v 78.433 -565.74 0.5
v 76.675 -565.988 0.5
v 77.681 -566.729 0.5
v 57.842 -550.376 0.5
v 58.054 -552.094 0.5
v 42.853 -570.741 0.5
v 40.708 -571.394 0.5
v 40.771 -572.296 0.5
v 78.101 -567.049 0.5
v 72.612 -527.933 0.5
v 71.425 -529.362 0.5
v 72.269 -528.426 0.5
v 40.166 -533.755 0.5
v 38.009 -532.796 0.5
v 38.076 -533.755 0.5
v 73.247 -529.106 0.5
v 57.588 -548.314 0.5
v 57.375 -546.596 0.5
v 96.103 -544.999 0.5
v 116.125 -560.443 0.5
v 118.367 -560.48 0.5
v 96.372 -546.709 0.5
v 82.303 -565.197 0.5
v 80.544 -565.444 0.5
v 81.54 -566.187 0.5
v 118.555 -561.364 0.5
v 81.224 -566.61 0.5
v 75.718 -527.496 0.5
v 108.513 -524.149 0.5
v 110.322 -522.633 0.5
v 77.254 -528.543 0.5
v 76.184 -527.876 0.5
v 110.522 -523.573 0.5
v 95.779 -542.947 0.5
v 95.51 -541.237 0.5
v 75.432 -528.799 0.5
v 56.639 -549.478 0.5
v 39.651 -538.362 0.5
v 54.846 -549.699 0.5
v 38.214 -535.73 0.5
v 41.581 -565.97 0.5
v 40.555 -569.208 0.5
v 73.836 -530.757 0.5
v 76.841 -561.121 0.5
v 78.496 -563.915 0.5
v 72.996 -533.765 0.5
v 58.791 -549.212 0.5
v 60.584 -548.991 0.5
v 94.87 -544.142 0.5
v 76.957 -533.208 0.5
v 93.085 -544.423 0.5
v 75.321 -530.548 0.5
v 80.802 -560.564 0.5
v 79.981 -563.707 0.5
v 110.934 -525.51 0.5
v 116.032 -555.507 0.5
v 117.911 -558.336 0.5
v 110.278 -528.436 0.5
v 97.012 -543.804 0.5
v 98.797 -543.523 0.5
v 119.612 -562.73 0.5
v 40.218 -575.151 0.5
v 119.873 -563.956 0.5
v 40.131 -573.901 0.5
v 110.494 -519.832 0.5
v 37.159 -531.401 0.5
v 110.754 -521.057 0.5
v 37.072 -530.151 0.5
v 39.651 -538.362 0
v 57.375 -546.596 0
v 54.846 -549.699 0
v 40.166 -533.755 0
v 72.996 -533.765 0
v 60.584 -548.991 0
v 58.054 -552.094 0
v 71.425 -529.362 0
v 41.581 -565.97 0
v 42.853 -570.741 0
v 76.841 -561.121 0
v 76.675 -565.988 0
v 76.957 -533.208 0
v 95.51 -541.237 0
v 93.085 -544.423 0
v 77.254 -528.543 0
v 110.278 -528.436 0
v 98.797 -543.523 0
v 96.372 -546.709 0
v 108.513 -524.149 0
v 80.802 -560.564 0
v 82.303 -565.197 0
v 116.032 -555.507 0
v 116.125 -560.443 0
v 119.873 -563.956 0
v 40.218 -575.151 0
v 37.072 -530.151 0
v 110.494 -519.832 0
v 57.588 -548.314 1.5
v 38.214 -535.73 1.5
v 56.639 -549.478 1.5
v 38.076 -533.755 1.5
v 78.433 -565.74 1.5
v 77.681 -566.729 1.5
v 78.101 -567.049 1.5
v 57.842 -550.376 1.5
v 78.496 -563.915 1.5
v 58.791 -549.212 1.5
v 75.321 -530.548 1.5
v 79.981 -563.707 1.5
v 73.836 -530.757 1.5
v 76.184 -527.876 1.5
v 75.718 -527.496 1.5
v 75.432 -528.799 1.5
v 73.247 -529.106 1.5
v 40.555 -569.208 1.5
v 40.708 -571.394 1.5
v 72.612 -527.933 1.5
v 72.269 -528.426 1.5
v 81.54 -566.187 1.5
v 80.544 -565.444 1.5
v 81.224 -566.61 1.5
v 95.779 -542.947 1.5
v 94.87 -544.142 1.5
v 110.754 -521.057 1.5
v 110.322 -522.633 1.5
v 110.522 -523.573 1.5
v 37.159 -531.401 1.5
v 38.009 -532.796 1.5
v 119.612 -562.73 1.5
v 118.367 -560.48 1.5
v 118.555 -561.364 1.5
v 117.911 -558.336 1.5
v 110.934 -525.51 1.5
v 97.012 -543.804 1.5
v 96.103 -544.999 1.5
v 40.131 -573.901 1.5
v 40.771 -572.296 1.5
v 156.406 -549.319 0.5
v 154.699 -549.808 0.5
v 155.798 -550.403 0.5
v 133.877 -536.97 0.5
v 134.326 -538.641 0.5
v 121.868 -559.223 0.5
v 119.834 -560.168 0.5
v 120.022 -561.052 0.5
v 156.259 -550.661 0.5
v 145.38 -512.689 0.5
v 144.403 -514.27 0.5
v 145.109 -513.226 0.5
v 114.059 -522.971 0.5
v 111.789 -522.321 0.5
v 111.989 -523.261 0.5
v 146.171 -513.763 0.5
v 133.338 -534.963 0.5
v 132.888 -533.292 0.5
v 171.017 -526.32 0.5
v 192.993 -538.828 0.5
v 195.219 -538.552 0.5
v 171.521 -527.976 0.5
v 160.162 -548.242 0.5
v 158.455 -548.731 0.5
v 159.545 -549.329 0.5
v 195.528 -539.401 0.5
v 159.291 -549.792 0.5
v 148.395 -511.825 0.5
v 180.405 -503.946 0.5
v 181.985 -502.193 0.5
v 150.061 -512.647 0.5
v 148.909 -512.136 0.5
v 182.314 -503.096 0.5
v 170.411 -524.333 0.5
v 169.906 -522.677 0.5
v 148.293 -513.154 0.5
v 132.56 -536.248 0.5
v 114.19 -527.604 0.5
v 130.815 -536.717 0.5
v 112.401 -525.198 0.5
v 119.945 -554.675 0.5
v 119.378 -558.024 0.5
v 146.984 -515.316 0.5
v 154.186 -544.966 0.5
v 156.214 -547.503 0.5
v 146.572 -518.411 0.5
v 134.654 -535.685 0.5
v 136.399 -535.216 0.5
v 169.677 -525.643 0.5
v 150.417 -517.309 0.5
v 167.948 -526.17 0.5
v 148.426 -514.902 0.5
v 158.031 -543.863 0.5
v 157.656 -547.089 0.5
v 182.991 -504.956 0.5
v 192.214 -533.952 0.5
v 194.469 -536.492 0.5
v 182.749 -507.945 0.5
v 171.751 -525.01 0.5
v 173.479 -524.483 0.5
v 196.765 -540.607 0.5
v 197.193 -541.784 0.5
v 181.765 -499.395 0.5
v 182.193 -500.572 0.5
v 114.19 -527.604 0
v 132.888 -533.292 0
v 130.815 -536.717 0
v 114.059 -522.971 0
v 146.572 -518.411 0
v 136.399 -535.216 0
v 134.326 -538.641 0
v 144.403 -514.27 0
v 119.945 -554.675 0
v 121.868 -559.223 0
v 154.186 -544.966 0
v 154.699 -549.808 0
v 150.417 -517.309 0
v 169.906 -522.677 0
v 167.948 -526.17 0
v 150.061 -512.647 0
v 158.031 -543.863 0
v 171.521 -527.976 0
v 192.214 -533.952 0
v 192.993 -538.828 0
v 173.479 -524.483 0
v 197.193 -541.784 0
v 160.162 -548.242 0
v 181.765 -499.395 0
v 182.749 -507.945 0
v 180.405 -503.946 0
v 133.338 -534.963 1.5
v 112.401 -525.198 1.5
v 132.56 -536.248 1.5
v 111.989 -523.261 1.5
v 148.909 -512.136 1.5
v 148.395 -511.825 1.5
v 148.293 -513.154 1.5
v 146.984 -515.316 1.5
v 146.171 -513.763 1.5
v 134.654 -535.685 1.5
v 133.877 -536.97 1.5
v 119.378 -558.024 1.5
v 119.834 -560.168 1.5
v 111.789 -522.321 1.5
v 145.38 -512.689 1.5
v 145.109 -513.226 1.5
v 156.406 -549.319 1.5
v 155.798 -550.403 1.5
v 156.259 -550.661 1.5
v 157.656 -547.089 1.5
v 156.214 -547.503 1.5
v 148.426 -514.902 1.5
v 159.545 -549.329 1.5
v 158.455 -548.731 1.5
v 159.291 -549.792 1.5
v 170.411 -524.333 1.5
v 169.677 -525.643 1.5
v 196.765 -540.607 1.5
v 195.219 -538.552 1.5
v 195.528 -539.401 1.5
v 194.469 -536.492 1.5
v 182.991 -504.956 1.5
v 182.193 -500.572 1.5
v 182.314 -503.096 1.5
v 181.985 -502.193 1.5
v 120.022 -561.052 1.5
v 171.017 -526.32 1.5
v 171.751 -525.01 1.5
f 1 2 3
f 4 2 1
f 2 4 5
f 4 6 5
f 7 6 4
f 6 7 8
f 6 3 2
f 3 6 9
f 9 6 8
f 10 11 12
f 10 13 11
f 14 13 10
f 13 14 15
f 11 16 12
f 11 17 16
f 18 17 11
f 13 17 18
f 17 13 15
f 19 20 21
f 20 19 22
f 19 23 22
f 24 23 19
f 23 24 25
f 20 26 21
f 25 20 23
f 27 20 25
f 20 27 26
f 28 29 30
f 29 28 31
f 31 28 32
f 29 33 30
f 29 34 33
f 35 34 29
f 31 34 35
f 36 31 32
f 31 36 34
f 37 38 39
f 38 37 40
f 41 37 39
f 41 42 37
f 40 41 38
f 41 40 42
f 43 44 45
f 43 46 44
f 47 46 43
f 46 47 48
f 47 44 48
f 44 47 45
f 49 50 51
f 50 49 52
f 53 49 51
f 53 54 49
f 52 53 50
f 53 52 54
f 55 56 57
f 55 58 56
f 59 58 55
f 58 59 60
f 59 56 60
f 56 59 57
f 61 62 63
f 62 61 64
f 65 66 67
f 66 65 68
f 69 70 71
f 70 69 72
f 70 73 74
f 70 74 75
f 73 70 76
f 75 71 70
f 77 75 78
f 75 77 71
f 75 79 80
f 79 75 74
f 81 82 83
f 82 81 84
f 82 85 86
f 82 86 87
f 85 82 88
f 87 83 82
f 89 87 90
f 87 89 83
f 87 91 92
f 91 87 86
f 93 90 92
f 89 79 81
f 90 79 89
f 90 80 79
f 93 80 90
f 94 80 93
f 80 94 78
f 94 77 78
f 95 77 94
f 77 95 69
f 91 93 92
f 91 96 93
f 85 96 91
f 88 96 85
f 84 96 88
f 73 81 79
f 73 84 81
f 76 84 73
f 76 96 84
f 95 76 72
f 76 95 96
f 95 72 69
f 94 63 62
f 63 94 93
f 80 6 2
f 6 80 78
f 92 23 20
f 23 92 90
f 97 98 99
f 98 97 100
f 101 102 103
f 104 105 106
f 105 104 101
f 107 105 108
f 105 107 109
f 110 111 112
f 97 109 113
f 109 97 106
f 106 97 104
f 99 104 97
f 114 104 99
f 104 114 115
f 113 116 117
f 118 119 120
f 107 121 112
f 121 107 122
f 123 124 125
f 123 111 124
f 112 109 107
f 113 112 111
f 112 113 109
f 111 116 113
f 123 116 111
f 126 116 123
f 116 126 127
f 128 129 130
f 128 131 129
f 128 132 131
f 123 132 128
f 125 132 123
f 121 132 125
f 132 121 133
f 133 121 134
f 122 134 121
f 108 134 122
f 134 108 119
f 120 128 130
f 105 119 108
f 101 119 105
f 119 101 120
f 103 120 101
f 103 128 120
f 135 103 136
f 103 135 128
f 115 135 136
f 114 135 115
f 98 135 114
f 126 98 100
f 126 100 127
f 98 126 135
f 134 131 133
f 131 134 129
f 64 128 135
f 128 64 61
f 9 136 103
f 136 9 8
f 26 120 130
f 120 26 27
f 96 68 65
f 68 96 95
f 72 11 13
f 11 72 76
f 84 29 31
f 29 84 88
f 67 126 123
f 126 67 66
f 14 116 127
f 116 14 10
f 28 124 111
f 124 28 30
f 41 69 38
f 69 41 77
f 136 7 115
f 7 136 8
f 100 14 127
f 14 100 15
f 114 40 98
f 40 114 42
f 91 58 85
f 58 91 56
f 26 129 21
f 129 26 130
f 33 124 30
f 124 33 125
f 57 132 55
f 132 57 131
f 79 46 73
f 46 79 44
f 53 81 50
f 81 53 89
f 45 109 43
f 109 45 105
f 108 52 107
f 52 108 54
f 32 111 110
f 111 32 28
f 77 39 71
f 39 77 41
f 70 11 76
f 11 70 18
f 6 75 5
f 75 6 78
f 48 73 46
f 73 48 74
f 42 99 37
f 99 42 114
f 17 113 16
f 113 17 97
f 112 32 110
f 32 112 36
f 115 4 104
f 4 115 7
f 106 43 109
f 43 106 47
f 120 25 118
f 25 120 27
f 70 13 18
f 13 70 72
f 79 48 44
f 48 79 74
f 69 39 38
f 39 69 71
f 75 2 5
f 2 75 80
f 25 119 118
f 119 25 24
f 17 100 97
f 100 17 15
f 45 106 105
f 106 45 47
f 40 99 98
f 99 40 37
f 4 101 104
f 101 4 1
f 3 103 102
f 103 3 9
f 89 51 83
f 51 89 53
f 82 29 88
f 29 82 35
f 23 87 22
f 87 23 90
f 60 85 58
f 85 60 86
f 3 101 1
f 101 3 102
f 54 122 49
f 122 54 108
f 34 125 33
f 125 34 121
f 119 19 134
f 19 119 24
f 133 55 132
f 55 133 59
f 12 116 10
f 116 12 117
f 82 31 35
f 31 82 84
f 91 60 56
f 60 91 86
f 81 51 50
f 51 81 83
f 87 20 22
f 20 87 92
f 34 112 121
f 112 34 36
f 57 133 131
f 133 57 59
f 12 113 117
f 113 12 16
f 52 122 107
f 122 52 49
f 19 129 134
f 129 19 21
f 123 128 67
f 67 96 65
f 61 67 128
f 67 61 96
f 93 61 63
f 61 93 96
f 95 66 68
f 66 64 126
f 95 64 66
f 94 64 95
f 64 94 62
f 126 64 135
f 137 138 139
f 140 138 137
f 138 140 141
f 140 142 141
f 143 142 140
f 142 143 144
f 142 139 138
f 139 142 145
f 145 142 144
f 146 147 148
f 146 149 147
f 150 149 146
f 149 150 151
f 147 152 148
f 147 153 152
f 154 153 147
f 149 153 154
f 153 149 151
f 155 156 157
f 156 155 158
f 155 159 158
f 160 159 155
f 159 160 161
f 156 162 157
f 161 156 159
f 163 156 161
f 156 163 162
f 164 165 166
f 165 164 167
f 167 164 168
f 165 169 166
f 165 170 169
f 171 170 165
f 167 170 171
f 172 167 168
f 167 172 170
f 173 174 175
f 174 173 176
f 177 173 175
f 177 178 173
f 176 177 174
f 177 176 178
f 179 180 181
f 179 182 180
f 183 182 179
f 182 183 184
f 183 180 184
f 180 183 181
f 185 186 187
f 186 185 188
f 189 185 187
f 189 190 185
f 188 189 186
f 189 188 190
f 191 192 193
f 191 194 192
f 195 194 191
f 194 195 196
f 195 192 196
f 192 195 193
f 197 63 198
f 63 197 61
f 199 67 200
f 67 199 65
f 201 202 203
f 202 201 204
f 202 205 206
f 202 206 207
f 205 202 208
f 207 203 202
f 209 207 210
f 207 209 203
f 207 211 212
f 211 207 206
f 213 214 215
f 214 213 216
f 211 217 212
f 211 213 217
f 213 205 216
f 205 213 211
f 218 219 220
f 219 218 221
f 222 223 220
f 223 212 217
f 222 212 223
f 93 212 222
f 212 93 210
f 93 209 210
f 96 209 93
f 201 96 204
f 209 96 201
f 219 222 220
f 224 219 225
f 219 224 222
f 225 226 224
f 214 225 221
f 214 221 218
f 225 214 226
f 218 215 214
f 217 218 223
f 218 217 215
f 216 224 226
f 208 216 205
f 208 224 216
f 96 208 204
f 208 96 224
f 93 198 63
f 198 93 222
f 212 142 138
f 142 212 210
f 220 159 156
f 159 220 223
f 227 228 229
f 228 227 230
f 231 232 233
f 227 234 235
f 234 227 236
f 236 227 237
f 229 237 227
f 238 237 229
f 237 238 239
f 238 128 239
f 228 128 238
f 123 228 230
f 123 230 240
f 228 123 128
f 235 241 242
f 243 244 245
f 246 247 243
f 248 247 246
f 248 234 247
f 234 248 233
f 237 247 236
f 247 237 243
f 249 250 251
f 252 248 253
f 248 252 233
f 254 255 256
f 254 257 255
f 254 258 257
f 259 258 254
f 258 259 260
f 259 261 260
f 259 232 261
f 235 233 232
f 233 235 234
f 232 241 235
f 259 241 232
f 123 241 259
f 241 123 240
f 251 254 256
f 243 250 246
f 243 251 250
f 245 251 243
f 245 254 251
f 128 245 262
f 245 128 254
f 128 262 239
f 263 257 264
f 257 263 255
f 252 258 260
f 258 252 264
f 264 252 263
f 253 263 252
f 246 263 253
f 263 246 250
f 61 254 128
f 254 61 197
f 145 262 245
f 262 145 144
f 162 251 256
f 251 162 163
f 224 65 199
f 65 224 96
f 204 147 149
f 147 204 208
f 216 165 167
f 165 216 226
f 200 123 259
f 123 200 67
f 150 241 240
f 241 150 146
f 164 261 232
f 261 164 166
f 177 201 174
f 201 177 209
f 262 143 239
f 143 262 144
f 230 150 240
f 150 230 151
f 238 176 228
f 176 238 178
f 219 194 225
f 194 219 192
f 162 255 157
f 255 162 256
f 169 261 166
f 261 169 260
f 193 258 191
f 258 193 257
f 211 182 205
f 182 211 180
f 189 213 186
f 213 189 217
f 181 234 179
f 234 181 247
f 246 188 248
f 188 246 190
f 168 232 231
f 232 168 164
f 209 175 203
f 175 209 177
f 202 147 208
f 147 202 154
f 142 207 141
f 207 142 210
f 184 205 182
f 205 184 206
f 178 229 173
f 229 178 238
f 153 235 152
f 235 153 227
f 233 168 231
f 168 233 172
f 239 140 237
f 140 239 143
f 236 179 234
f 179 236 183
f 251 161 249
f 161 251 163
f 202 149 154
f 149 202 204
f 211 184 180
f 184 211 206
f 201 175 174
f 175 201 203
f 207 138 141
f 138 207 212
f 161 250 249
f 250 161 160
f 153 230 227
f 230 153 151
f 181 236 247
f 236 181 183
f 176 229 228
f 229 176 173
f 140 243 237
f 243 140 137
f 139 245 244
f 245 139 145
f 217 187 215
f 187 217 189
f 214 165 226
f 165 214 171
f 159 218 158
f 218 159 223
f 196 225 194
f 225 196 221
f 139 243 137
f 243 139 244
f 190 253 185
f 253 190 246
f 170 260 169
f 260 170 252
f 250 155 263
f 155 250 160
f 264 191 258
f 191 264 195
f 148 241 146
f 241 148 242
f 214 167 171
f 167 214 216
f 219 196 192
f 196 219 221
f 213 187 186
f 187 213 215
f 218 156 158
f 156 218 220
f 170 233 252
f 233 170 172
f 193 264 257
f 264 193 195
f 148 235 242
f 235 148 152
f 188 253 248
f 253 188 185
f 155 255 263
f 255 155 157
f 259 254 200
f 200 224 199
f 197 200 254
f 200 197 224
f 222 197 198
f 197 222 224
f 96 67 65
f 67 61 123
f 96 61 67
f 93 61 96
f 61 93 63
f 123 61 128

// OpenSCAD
$fn = 16;

// ============================================================
// H0 Bogenbrücke – BODENELEMENTE
// Märklin K-Gleis R5 (618 mm), 40°, 5 Segmente
//
// Jedes Segment = 4 Strukturelemente:
//   1) Trapezförmiger Außenrahmen
//   2) Mittelstrebe (halbiert das Segment)
//   3) X-Aussteifung linke Hälfte
//   4) X-Aussteifung rechte Hälfte
//
// Gehrungswinkel je Verbindungsfuge: 4° (= ang_seg/2)
// Endsegmente (i=0 und i=4): äußeres Ende rechtwinklig (90°)
// ============================================================

// --- Gleisgeometrie -----------------------------------------
R        = 554;
bogen    = 40;
n_seg    = 5;
ang_seg  = bogen / n_seg;             // 8° pro Segment
hm       = ang_seg / 2;               // Gehrungswinkel = 4°
seg_L    = 2 * R * sin(ang_seg / 2);  // Sehnenlänge ≈ 86.2 mm

// --- Querschnitt --------------------------------------------
licht_b  = 36;
d_stab   = 2.5;
aussen_b = licht_b + 2 * d_stab;     // Gesamtbreite ≈ 41 mm
hw       = aussen_b / 2;              // Halbbreite ≈ 20.5 mm

// --- T-Träger-Profil ----------------------------------------
//   Flansch (flache Seite, liegt auf Grundplatte): 4 mm × 0.5 mm
//   Steg (mittig oben):                            2 mm × 1.0 mm
flange_w = 4.0;
flange_h = 0.5;
web_w    = 1.5;
web_h    = 1.0;

// --- Rendersteuerung ----------------------------------------
//  render_from, render_to: Segmentbereich (1-indiziert, inklusiv)
//    1 + 5  →  alle 5 Segmente
//    1 + 2  →  Segmente 1 und 2
//    3 + 3  →  nur Segment 3
//  print_half:  0 = vollständig
//               1 = linke Druckhälfte  (x ≤ 0, Seg 1+2 + halbes Seg 3)
//               2 = rechte Druckhälfte (x ≥ 0, halbes Seg 3 + Seg 4+5)
render_from = 4;
render_to   = 5;
print_half  = 0;
_big        = 2000;   // Hilfsgröße für den Schnittquader

// ============================================================
// Gehrungswinkel-Funktionen – alle Enden mit Gehrung hm = 4°
function ml(i) = hm;
function mr(i) = hm;

// ============================================================
// T-Träger-Balken von p1 nach p2 in der XY-Ebene
//   Flansch (unten): flange_w × flange_h
//   Steg   (oben, zentriert): web_w × web_h
// with_ext = true  → Längsbalken / Diagonalen: Überstand flange_w/2 an jedem Ende
// with_ext = false → Querbalken:               kein Überstand, Enden bündig
module balken(p1, p2, with_ext = true) {
    dx  = p2[0] - p1[0];
    dy  = p2[1] - p1[1];
    L   = sqrt(dx*dx + dy*dy);
    a   = atan2(dy, dx);
    ext = with_ext ? flange_w / 2 : 0;
    translate([p1[0], p1[1], 0])
    rotate([0, 0, a]) {
        translate([-ext, -flange_w/2, 0])
            cube([L + 2*ext, flange_w, flange_h]);
        translate([-ext, -web_w/2, flange_h])
            cube([L + 2*ext, web_w, web_h]);
    }
}

// ============================================================
// Einzelnes Bodensegment
//
// Koordinatensystem (lokal):
//   X  = Längsrichtung (Gleisrichtung), 0 … seg_L
//   Y  = Querrichtung, Gleisachse bei Y = 0
//        Y = −hw : Außenbogen (größerer Radius)
//        Y = +hw : Innenbogen (kleinerer Radius)
//   Z  = aufwärts, Platte von 0 … panel_h
//
// Geometrie der Gehrung:
//   Linkes  Ende: Schnittlinie  x = y · tan(miter_L)
//   Rechtes Ende: Schnittlinie  x = seg_L − y · tan(miter_R)
//   → Innenkante (y=+hw) kürzer, Außenkante (y=−hw) länger ✓
module boden_segment(miter_L, miter_R) {

    // Längsbalken-Mittellinien (Außenrahmen, Diagonalen)
    OL = [-hw * tan(miter_L),          -hw];
    IL = [ hw * tan(miter_L),          +hw];
    OR = [ seg_L + hw * tan(miter_R),  -hw];
    IR = [ seg_L - hw * tan(miter_R),  +hw];

    // Querbalken-Endpunkte: zur Innenfläche der Längsbalken-Flansche verschoben
    // → Querbalken ragen nicht über die Längsbalken-Flansche hinaus
    hw_q = hw - flange_w / 2;
    OL_q = [-hw_q * tan(miter_L), -hw_q];
    IL_q = [ hw_q * tan(miter_L), +hw_q];
    OR_q = [ seg_L + hw_q * tan(miter_R), -hw_q];
    IR_q = [ seg_L - hw_q * tan(miter_R), +hw_q];

    // Mittelpunkte (für Diagonalen an Längsbalken, für Mittelstrebe an Innenfläche)
    OM   = [seg_L / 2, -hw];
    IM   = [seg_L / 2, +hw];
    OM_q = [seg_L / 2, -hw_q];
    IM_q = [seg_L / 2, +hw_q];

    // Schnittpolygon: Trapez um flange_w/2 nach außen erweitert,
    // damit die Flansche der Längsbalken vollständig erhalten bleiben
    // und die Gehrungsenden exakt bündig abgeschnitten werden.
    hw_c = hw + flange_w / 2;
    eOL = [-hw_c * tan(miter_L), -hw_c];
    eIL = [ hw_c * tan(miter_L),  hw_c];
    eIR = [seg_L - hw_c * tan(miter_R),  hw_c];
    eOR = [seg_L + hw_c * tan(miter_R), -hw_c];

    intersection() {
        linear_extrude(flange_h + web_h)
            polygon([eOL, eIL, eIR, eOR]);

        union() {
            // 1a) Längsbalken (Außen- und Innenkante) – mit Überstand
            color([1,0,0]) {
                balken(OR, OL);          // Außenkante
                balken(IL, IR);          // Innenkante
            }
            // 1b) Querbalken (Enden) – Endpunkt an Innenfläche, Überstand reicht bis Mittelline
            color([1,0,0]) {
                balken(OL_q, IL_q);   // linkes Ende
                balken(IR_q, OR_q);   // rechtes Ende
            }
            // 2) Mittelstrebe – dto.
            color([0,1,0]) balken(OM_q, IM_q);
            // 3) X linke Hälfte
            color([0,0,1]) {
                balken(OL_q, IM_q);
                balken(IL_q, OM_q);
            }
            // 4) X rechte Hälfte
            color([0,0,1]) {
                balken(OM_q, IR_q);
                balken(IM_q, OR_q);
            }
        }
    }
}

// ============================================================
// Schnittquader: schneidet die Geometrie bei x=0 (Bogenmitte)
// Segment 3 liegt symmetrisch um x=0 → saubere Trennkante
module links()  { translate([-_big, -_big, -_big]) cube([_big, 2*_big, 2*_big]); }
module rechts() { translate([    0, -_big, -_big]) cube([_big, 2*_big, 2*_big]); }

// ============================================================
// Render: render_from .. render_to (1-indiziert) im Bogen platzieren
module _basis() {
    for (i = [render_from - 1 : render_to - 1]) {
        a_start = -bogen/2 + i * ang_seg;
        px      =  R * sin(a_start);
        py      = -R * cos(a_start);
        a_chord = a_start + ang_seg / 2;

        translate([px, py, 0])
        rotate([0, 0, a_chord])
        boden_segment(ml(i), mr(i));
    }
}

if      (print_half == 1) intersection() { _basis(); links();  }
else if (print_half == 2) intersection() { _basis(); rechts(); }
else                                       _basis();
